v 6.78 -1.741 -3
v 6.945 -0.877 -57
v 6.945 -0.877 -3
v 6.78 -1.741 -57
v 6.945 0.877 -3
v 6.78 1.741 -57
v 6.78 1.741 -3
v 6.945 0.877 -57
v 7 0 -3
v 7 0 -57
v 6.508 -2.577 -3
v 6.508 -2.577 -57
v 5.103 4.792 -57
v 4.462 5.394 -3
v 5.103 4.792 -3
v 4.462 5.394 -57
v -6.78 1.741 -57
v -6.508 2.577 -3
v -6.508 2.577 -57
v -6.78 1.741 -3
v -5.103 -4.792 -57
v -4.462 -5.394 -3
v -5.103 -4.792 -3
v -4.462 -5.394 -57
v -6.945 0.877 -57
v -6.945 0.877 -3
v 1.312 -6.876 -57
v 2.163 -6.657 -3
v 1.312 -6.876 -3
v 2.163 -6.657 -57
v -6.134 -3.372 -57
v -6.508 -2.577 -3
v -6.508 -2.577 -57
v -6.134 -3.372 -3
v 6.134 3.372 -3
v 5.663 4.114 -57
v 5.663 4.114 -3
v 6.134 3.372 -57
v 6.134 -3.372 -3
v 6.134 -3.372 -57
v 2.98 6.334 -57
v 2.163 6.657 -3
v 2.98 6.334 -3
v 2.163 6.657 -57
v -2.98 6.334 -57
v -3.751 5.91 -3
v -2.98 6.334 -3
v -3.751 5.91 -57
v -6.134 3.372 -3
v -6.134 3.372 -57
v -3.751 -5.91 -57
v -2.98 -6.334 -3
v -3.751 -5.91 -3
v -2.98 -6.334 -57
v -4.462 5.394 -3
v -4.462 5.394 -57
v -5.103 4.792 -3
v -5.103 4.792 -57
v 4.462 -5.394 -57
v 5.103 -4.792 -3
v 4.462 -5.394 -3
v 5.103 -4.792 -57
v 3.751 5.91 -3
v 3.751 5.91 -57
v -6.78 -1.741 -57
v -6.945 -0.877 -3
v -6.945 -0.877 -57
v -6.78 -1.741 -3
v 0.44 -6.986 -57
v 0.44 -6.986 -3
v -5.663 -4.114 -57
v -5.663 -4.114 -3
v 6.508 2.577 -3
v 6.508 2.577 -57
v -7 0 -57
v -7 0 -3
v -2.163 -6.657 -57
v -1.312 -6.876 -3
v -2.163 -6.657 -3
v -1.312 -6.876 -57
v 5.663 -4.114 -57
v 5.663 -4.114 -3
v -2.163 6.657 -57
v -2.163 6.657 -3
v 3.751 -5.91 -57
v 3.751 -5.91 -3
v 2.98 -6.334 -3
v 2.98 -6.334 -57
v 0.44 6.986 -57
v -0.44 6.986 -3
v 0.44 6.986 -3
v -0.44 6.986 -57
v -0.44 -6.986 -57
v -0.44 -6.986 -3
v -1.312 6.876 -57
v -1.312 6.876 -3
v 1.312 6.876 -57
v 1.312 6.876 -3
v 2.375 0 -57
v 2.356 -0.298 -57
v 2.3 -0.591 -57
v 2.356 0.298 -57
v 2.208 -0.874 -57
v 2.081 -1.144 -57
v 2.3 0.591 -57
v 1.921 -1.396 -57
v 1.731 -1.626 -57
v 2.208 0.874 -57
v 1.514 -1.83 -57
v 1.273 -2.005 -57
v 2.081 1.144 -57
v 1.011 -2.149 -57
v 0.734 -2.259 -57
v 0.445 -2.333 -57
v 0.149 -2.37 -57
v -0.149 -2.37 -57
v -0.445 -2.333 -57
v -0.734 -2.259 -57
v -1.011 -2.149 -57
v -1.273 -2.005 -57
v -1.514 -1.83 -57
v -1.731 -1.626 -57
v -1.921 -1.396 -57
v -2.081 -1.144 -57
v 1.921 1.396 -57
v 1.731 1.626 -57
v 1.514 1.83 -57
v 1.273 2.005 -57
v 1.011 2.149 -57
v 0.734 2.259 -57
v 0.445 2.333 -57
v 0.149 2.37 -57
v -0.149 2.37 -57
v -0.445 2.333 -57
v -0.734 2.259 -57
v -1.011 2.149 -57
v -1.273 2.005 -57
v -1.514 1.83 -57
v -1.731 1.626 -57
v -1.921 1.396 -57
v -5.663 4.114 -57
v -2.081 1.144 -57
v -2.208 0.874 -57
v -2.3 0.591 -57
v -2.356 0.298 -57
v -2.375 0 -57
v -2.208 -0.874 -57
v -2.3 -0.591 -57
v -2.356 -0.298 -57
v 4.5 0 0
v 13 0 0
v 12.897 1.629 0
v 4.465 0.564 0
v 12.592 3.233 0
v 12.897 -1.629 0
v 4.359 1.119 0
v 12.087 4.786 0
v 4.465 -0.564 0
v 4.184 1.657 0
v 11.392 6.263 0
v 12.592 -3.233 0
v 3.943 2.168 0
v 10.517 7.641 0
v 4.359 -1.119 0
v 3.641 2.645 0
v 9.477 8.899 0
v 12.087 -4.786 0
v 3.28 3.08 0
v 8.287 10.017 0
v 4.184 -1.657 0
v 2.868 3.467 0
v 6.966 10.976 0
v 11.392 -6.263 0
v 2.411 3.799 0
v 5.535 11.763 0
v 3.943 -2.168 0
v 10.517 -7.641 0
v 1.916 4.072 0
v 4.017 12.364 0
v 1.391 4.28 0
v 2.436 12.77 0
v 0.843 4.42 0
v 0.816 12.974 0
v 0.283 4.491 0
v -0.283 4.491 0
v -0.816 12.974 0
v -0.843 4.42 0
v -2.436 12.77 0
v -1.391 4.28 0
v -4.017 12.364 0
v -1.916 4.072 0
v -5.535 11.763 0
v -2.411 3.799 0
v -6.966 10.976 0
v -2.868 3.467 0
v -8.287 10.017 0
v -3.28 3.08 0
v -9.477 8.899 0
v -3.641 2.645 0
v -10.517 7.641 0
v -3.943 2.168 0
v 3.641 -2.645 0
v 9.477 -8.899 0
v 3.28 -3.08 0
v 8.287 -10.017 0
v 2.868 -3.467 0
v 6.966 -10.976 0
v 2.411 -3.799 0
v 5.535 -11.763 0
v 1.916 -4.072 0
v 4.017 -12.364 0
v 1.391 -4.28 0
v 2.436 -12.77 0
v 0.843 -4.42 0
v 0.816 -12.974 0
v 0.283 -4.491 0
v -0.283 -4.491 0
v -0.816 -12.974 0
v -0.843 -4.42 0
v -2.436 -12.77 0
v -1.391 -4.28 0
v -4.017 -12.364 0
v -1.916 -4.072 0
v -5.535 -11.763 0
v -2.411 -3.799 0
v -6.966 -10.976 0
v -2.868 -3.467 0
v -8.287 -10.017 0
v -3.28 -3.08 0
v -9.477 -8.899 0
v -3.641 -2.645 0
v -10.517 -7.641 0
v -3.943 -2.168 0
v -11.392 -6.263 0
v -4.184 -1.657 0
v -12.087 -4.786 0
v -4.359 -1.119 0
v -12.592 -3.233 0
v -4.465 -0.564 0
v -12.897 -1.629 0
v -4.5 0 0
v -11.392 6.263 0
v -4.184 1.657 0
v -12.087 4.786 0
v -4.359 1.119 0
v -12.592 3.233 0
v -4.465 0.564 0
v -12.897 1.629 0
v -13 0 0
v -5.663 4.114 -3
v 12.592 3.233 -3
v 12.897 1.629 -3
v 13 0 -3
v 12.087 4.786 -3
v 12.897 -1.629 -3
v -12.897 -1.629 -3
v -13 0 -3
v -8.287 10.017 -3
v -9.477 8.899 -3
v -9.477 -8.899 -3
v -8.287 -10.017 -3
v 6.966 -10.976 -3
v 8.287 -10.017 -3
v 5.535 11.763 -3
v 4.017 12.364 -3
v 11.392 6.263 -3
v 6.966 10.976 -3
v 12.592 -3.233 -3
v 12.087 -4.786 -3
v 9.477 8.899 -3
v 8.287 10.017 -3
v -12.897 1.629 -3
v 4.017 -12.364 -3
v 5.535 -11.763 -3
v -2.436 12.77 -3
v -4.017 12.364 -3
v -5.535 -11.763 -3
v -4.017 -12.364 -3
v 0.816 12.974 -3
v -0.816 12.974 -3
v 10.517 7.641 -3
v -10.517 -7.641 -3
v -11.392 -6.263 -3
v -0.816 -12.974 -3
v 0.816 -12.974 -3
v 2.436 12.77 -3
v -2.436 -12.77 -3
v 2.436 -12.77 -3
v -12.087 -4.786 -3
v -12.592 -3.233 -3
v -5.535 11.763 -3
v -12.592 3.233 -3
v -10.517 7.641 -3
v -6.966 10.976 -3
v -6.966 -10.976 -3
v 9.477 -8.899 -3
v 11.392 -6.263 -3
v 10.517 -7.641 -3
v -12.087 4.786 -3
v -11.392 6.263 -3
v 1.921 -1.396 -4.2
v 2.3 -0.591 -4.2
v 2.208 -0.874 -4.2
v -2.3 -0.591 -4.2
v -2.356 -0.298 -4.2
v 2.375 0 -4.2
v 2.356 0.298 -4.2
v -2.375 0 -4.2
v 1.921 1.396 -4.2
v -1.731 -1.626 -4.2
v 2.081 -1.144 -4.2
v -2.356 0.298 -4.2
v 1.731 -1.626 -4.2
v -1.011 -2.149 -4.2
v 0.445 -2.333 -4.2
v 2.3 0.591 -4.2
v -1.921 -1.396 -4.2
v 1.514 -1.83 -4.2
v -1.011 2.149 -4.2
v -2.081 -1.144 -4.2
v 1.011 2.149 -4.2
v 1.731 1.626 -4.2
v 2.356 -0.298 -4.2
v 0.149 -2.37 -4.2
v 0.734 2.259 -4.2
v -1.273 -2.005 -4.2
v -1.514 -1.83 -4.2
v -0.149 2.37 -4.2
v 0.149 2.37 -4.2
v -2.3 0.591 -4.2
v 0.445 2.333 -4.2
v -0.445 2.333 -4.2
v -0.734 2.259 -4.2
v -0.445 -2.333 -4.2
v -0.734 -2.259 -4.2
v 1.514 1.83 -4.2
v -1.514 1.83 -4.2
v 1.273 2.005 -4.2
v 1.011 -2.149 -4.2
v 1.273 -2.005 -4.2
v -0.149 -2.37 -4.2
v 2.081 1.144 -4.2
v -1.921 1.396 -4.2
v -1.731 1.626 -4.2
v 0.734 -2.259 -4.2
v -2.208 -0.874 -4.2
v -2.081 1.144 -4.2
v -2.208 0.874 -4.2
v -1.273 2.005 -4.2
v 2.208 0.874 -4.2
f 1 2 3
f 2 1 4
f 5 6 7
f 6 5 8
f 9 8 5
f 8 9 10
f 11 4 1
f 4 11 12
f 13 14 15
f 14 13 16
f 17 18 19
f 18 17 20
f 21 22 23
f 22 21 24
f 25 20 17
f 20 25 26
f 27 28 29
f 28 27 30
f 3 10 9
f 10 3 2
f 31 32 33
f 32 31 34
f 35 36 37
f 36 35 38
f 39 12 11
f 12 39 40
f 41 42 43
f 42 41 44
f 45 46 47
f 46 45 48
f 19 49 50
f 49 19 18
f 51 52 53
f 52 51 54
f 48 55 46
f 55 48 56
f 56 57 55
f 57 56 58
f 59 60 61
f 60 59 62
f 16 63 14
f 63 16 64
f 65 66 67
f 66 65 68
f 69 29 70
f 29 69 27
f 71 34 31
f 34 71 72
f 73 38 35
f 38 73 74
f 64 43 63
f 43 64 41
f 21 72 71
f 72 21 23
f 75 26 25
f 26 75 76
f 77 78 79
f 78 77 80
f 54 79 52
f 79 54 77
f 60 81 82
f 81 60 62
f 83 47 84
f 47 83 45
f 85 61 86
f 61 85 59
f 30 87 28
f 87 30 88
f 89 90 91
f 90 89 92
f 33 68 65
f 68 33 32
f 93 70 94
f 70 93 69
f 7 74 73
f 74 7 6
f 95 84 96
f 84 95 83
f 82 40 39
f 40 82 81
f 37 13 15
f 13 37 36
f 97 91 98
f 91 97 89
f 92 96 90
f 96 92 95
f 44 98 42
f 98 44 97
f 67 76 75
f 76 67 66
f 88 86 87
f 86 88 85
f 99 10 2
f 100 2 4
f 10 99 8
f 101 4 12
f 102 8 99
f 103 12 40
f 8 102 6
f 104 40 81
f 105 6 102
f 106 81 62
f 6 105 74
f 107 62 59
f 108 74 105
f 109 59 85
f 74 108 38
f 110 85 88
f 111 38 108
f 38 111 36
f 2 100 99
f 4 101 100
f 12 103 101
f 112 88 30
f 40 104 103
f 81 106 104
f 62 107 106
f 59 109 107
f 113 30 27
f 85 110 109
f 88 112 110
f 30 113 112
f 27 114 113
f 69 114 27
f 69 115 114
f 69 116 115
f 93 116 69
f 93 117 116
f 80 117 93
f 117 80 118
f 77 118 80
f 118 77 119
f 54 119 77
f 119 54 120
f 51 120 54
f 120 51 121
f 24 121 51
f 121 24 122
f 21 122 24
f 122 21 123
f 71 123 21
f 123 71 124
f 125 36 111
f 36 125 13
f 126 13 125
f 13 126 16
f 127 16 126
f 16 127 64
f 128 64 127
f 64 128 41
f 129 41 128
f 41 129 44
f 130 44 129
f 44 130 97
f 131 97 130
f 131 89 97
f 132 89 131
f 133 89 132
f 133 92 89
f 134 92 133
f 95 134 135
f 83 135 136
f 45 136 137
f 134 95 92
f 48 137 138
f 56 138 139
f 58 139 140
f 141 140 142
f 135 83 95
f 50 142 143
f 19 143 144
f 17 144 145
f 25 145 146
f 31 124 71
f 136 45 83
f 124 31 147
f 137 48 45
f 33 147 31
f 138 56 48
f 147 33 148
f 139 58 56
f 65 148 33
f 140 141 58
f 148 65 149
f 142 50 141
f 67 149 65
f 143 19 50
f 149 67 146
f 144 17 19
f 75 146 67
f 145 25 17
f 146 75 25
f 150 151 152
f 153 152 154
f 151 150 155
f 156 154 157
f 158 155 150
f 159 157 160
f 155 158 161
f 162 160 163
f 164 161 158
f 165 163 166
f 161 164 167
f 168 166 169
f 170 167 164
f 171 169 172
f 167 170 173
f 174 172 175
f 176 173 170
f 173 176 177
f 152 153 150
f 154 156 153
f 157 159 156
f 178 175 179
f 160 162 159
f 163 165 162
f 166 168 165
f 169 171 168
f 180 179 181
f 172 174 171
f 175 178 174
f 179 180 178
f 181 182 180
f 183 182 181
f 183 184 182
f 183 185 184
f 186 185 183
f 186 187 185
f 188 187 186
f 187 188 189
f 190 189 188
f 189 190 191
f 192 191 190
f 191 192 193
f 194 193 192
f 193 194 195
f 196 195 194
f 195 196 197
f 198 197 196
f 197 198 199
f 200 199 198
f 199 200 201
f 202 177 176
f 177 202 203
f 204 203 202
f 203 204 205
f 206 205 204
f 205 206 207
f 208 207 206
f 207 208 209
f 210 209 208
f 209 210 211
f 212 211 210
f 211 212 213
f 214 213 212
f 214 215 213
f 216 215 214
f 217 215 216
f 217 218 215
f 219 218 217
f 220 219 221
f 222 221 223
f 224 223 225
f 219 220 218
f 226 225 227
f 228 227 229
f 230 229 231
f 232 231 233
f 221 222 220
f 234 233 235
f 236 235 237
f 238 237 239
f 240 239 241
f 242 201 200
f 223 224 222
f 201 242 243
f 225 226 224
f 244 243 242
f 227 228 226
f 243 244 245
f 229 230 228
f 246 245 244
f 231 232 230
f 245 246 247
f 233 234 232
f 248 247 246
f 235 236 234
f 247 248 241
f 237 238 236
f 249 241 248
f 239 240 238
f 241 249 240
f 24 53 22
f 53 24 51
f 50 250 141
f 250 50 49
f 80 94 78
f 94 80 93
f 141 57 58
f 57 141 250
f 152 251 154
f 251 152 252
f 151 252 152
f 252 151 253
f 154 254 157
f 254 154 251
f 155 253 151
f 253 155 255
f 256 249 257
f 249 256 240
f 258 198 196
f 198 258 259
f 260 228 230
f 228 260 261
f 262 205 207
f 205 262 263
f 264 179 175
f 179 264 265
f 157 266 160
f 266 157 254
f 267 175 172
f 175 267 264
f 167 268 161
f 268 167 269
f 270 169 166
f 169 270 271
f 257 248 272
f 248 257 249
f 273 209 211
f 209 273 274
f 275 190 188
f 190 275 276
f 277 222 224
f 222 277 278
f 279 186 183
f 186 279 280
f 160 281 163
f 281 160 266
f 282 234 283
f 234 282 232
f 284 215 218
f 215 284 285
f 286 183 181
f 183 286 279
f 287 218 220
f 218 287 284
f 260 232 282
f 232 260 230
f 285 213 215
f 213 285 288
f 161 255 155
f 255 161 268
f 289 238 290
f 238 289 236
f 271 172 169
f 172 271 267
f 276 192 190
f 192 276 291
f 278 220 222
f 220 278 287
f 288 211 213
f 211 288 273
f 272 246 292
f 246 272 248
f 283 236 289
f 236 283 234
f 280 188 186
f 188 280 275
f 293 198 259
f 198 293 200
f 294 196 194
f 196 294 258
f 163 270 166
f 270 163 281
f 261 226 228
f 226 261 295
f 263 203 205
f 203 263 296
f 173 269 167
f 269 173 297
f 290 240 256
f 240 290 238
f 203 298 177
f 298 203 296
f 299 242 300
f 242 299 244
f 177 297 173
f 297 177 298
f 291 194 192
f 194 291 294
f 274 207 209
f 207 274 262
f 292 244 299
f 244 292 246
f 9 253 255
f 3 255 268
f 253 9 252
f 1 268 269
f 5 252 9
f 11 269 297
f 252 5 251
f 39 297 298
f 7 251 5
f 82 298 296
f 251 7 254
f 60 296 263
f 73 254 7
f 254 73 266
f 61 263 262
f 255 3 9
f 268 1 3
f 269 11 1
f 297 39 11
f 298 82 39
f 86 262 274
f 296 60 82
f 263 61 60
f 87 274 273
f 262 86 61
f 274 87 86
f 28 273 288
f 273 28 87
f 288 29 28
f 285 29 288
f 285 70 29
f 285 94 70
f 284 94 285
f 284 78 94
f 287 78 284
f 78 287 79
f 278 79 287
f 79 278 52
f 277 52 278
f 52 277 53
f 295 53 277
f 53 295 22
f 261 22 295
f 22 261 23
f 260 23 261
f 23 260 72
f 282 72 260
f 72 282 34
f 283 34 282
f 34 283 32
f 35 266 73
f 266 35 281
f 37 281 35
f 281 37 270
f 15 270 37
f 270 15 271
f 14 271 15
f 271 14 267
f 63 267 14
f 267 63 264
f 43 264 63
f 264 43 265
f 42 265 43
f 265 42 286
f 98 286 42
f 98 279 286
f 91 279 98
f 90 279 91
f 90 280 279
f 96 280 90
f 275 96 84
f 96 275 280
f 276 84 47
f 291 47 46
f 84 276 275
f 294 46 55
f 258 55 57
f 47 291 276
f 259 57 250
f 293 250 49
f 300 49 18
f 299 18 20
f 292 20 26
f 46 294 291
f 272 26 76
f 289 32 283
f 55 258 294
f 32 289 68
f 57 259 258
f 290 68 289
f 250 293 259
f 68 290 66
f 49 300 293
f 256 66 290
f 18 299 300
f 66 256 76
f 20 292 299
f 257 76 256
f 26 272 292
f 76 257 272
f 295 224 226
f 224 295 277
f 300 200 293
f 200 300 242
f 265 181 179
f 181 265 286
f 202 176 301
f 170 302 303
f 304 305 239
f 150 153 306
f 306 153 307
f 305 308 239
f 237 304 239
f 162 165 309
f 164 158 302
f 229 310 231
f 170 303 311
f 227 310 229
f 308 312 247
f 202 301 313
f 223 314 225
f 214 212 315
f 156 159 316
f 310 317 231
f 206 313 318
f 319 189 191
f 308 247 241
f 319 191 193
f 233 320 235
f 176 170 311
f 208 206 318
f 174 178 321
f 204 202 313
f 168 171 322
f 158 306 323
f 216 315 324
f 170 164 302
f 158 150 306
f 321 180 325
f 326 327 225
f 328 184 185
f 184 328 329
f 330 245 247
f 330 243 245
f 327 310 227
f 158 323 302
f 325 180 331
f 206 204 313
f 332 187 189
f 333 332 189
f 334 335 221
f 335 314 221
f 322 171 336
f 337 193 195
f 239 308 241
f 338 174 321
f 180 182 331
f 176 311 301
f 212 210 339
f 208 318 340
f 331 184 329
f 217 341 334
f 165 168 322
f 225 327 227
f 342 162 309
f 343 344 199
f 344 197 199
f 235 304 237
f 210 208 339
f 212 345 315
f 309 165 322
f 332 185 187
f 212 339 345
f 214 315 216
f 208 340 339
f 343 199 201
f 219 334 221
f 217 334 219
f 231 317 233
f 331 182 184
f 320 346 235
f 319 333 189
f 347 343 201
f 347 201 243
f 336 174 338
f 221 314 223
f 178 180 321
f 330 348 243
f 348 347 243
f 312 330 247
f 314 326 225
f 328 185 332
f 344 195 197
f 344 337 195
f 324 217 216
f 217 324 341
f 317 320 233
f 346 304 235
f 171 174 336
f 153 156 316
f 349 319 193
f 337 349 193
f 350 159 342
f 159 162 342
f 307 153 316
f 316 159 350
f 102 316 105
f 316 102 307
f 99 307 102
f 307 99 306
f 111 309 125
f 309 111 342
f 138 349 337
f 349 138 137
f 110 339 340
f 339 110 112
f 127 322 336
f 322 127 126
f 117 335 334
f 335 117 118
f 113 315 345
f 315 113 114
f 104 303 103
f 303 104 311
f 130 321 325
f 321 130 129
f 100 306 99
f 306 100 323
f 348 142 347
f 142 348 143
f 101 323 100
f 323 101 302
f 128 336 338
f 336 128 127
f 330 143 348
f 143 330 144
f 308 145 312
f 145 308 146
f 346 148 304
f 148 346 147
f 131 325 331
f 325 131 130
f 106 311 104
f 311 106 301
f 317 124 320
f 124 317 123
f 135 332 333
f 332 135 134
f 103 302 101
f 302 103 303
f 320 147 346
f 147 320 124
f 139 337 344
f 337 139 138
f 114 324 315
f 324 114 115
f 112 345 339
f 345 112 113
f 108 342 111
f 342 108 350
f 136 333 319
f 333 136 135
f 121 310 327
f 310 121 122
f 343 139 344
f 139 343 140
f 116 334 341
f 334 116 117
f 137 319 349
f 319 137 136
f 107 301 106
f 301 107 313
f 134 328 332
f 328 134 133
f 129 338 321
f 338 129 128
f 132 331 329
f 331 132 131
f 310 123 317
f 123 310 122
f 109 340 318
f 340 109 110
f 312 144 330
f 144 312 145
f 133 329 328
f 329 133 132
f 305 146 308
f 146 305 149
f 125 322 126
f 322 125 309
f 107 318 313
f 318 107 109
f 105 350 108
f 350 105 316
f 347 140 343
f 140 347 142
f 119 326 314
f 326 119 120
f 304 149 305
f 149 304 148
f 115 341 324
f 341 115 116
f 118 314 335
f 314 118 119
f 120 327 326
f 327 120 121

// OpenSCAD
$fn = 50;


difference() {
	union() {
		translate(v = [0, 0, -57.0000000000]) {
			cylinder(h = 57, r = 7.0000000000);
		}
		translate(v = [0, 0, -3.0000000000]) {
			cylinder(h = 3, r = 13.0000000000);
		}
	}
	union() {
		translate(v = [0, 0, 0]) {
			rotate(a = [0, 0, 0]) {
				difference() {
					union() {
						#translate(v = [0, 0, -57.0000000000]) {
							cylinder(h = 57, r = 2.2500000000);
						}
						#translate(v = [0, 0, -4.2000000000]) {
							cylinder(h = 4.2000000000, r = 7.0000000000, r1 = 2.3750000000, r2 = 4.5000000000);
						}
						#translate(v = [0, 0, -57.0000000000]) {
							cylinder(h = 57, r = 2.3750000000);
						}
						#translate(v = [0, 0, -57.0000000000]) {
							cylinder(h = 57, r = 2.2500000000);
						}
					}
					union();
				}
			}
		}
	}
}
